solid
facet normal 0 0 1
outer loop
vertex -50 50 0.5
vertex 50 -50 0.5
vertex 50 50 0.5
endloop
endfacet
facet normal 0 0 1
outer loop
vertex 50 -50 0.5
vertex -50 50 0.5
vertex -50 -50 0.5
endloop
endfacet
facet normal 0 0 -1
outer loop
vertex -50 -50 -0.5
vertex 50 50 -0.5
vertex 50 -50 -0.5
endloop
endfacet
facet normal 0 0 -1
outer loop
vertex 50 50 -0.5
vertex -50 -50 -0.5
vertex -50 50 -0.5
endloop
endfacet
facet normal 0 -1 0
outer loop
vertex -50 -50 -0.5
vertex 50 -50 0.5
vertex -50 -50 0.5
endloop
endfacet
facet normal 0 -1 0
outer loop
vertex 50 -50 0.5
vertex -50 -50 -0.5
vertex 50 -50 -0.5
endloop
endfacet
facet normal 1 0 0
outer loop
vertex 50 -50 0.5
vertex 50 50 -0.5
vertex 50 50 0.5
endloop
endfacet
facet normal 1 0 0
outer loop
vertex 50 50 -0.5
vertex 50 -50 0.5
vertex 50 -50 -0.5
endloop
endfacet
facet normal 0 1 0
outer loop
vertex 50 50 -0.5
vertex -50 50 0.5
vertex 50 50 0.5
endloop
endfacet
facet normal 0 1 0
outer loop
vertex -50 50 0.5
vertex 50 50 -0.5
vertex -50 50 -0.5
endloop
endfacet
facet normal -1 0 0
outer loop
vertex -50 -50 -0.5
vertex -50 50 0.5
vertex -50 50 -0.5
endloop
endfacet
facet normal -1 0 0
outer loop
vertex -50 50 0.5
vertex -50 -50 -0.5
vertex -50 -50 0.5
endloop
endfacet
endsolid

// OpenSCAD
$fn = 50;

pcb();

module pcb(pcbL = 100, pcbW = 100, pcbH = 1){
    color("pink") cube([pcbL,pcbW, pcbH],center = true);
}
